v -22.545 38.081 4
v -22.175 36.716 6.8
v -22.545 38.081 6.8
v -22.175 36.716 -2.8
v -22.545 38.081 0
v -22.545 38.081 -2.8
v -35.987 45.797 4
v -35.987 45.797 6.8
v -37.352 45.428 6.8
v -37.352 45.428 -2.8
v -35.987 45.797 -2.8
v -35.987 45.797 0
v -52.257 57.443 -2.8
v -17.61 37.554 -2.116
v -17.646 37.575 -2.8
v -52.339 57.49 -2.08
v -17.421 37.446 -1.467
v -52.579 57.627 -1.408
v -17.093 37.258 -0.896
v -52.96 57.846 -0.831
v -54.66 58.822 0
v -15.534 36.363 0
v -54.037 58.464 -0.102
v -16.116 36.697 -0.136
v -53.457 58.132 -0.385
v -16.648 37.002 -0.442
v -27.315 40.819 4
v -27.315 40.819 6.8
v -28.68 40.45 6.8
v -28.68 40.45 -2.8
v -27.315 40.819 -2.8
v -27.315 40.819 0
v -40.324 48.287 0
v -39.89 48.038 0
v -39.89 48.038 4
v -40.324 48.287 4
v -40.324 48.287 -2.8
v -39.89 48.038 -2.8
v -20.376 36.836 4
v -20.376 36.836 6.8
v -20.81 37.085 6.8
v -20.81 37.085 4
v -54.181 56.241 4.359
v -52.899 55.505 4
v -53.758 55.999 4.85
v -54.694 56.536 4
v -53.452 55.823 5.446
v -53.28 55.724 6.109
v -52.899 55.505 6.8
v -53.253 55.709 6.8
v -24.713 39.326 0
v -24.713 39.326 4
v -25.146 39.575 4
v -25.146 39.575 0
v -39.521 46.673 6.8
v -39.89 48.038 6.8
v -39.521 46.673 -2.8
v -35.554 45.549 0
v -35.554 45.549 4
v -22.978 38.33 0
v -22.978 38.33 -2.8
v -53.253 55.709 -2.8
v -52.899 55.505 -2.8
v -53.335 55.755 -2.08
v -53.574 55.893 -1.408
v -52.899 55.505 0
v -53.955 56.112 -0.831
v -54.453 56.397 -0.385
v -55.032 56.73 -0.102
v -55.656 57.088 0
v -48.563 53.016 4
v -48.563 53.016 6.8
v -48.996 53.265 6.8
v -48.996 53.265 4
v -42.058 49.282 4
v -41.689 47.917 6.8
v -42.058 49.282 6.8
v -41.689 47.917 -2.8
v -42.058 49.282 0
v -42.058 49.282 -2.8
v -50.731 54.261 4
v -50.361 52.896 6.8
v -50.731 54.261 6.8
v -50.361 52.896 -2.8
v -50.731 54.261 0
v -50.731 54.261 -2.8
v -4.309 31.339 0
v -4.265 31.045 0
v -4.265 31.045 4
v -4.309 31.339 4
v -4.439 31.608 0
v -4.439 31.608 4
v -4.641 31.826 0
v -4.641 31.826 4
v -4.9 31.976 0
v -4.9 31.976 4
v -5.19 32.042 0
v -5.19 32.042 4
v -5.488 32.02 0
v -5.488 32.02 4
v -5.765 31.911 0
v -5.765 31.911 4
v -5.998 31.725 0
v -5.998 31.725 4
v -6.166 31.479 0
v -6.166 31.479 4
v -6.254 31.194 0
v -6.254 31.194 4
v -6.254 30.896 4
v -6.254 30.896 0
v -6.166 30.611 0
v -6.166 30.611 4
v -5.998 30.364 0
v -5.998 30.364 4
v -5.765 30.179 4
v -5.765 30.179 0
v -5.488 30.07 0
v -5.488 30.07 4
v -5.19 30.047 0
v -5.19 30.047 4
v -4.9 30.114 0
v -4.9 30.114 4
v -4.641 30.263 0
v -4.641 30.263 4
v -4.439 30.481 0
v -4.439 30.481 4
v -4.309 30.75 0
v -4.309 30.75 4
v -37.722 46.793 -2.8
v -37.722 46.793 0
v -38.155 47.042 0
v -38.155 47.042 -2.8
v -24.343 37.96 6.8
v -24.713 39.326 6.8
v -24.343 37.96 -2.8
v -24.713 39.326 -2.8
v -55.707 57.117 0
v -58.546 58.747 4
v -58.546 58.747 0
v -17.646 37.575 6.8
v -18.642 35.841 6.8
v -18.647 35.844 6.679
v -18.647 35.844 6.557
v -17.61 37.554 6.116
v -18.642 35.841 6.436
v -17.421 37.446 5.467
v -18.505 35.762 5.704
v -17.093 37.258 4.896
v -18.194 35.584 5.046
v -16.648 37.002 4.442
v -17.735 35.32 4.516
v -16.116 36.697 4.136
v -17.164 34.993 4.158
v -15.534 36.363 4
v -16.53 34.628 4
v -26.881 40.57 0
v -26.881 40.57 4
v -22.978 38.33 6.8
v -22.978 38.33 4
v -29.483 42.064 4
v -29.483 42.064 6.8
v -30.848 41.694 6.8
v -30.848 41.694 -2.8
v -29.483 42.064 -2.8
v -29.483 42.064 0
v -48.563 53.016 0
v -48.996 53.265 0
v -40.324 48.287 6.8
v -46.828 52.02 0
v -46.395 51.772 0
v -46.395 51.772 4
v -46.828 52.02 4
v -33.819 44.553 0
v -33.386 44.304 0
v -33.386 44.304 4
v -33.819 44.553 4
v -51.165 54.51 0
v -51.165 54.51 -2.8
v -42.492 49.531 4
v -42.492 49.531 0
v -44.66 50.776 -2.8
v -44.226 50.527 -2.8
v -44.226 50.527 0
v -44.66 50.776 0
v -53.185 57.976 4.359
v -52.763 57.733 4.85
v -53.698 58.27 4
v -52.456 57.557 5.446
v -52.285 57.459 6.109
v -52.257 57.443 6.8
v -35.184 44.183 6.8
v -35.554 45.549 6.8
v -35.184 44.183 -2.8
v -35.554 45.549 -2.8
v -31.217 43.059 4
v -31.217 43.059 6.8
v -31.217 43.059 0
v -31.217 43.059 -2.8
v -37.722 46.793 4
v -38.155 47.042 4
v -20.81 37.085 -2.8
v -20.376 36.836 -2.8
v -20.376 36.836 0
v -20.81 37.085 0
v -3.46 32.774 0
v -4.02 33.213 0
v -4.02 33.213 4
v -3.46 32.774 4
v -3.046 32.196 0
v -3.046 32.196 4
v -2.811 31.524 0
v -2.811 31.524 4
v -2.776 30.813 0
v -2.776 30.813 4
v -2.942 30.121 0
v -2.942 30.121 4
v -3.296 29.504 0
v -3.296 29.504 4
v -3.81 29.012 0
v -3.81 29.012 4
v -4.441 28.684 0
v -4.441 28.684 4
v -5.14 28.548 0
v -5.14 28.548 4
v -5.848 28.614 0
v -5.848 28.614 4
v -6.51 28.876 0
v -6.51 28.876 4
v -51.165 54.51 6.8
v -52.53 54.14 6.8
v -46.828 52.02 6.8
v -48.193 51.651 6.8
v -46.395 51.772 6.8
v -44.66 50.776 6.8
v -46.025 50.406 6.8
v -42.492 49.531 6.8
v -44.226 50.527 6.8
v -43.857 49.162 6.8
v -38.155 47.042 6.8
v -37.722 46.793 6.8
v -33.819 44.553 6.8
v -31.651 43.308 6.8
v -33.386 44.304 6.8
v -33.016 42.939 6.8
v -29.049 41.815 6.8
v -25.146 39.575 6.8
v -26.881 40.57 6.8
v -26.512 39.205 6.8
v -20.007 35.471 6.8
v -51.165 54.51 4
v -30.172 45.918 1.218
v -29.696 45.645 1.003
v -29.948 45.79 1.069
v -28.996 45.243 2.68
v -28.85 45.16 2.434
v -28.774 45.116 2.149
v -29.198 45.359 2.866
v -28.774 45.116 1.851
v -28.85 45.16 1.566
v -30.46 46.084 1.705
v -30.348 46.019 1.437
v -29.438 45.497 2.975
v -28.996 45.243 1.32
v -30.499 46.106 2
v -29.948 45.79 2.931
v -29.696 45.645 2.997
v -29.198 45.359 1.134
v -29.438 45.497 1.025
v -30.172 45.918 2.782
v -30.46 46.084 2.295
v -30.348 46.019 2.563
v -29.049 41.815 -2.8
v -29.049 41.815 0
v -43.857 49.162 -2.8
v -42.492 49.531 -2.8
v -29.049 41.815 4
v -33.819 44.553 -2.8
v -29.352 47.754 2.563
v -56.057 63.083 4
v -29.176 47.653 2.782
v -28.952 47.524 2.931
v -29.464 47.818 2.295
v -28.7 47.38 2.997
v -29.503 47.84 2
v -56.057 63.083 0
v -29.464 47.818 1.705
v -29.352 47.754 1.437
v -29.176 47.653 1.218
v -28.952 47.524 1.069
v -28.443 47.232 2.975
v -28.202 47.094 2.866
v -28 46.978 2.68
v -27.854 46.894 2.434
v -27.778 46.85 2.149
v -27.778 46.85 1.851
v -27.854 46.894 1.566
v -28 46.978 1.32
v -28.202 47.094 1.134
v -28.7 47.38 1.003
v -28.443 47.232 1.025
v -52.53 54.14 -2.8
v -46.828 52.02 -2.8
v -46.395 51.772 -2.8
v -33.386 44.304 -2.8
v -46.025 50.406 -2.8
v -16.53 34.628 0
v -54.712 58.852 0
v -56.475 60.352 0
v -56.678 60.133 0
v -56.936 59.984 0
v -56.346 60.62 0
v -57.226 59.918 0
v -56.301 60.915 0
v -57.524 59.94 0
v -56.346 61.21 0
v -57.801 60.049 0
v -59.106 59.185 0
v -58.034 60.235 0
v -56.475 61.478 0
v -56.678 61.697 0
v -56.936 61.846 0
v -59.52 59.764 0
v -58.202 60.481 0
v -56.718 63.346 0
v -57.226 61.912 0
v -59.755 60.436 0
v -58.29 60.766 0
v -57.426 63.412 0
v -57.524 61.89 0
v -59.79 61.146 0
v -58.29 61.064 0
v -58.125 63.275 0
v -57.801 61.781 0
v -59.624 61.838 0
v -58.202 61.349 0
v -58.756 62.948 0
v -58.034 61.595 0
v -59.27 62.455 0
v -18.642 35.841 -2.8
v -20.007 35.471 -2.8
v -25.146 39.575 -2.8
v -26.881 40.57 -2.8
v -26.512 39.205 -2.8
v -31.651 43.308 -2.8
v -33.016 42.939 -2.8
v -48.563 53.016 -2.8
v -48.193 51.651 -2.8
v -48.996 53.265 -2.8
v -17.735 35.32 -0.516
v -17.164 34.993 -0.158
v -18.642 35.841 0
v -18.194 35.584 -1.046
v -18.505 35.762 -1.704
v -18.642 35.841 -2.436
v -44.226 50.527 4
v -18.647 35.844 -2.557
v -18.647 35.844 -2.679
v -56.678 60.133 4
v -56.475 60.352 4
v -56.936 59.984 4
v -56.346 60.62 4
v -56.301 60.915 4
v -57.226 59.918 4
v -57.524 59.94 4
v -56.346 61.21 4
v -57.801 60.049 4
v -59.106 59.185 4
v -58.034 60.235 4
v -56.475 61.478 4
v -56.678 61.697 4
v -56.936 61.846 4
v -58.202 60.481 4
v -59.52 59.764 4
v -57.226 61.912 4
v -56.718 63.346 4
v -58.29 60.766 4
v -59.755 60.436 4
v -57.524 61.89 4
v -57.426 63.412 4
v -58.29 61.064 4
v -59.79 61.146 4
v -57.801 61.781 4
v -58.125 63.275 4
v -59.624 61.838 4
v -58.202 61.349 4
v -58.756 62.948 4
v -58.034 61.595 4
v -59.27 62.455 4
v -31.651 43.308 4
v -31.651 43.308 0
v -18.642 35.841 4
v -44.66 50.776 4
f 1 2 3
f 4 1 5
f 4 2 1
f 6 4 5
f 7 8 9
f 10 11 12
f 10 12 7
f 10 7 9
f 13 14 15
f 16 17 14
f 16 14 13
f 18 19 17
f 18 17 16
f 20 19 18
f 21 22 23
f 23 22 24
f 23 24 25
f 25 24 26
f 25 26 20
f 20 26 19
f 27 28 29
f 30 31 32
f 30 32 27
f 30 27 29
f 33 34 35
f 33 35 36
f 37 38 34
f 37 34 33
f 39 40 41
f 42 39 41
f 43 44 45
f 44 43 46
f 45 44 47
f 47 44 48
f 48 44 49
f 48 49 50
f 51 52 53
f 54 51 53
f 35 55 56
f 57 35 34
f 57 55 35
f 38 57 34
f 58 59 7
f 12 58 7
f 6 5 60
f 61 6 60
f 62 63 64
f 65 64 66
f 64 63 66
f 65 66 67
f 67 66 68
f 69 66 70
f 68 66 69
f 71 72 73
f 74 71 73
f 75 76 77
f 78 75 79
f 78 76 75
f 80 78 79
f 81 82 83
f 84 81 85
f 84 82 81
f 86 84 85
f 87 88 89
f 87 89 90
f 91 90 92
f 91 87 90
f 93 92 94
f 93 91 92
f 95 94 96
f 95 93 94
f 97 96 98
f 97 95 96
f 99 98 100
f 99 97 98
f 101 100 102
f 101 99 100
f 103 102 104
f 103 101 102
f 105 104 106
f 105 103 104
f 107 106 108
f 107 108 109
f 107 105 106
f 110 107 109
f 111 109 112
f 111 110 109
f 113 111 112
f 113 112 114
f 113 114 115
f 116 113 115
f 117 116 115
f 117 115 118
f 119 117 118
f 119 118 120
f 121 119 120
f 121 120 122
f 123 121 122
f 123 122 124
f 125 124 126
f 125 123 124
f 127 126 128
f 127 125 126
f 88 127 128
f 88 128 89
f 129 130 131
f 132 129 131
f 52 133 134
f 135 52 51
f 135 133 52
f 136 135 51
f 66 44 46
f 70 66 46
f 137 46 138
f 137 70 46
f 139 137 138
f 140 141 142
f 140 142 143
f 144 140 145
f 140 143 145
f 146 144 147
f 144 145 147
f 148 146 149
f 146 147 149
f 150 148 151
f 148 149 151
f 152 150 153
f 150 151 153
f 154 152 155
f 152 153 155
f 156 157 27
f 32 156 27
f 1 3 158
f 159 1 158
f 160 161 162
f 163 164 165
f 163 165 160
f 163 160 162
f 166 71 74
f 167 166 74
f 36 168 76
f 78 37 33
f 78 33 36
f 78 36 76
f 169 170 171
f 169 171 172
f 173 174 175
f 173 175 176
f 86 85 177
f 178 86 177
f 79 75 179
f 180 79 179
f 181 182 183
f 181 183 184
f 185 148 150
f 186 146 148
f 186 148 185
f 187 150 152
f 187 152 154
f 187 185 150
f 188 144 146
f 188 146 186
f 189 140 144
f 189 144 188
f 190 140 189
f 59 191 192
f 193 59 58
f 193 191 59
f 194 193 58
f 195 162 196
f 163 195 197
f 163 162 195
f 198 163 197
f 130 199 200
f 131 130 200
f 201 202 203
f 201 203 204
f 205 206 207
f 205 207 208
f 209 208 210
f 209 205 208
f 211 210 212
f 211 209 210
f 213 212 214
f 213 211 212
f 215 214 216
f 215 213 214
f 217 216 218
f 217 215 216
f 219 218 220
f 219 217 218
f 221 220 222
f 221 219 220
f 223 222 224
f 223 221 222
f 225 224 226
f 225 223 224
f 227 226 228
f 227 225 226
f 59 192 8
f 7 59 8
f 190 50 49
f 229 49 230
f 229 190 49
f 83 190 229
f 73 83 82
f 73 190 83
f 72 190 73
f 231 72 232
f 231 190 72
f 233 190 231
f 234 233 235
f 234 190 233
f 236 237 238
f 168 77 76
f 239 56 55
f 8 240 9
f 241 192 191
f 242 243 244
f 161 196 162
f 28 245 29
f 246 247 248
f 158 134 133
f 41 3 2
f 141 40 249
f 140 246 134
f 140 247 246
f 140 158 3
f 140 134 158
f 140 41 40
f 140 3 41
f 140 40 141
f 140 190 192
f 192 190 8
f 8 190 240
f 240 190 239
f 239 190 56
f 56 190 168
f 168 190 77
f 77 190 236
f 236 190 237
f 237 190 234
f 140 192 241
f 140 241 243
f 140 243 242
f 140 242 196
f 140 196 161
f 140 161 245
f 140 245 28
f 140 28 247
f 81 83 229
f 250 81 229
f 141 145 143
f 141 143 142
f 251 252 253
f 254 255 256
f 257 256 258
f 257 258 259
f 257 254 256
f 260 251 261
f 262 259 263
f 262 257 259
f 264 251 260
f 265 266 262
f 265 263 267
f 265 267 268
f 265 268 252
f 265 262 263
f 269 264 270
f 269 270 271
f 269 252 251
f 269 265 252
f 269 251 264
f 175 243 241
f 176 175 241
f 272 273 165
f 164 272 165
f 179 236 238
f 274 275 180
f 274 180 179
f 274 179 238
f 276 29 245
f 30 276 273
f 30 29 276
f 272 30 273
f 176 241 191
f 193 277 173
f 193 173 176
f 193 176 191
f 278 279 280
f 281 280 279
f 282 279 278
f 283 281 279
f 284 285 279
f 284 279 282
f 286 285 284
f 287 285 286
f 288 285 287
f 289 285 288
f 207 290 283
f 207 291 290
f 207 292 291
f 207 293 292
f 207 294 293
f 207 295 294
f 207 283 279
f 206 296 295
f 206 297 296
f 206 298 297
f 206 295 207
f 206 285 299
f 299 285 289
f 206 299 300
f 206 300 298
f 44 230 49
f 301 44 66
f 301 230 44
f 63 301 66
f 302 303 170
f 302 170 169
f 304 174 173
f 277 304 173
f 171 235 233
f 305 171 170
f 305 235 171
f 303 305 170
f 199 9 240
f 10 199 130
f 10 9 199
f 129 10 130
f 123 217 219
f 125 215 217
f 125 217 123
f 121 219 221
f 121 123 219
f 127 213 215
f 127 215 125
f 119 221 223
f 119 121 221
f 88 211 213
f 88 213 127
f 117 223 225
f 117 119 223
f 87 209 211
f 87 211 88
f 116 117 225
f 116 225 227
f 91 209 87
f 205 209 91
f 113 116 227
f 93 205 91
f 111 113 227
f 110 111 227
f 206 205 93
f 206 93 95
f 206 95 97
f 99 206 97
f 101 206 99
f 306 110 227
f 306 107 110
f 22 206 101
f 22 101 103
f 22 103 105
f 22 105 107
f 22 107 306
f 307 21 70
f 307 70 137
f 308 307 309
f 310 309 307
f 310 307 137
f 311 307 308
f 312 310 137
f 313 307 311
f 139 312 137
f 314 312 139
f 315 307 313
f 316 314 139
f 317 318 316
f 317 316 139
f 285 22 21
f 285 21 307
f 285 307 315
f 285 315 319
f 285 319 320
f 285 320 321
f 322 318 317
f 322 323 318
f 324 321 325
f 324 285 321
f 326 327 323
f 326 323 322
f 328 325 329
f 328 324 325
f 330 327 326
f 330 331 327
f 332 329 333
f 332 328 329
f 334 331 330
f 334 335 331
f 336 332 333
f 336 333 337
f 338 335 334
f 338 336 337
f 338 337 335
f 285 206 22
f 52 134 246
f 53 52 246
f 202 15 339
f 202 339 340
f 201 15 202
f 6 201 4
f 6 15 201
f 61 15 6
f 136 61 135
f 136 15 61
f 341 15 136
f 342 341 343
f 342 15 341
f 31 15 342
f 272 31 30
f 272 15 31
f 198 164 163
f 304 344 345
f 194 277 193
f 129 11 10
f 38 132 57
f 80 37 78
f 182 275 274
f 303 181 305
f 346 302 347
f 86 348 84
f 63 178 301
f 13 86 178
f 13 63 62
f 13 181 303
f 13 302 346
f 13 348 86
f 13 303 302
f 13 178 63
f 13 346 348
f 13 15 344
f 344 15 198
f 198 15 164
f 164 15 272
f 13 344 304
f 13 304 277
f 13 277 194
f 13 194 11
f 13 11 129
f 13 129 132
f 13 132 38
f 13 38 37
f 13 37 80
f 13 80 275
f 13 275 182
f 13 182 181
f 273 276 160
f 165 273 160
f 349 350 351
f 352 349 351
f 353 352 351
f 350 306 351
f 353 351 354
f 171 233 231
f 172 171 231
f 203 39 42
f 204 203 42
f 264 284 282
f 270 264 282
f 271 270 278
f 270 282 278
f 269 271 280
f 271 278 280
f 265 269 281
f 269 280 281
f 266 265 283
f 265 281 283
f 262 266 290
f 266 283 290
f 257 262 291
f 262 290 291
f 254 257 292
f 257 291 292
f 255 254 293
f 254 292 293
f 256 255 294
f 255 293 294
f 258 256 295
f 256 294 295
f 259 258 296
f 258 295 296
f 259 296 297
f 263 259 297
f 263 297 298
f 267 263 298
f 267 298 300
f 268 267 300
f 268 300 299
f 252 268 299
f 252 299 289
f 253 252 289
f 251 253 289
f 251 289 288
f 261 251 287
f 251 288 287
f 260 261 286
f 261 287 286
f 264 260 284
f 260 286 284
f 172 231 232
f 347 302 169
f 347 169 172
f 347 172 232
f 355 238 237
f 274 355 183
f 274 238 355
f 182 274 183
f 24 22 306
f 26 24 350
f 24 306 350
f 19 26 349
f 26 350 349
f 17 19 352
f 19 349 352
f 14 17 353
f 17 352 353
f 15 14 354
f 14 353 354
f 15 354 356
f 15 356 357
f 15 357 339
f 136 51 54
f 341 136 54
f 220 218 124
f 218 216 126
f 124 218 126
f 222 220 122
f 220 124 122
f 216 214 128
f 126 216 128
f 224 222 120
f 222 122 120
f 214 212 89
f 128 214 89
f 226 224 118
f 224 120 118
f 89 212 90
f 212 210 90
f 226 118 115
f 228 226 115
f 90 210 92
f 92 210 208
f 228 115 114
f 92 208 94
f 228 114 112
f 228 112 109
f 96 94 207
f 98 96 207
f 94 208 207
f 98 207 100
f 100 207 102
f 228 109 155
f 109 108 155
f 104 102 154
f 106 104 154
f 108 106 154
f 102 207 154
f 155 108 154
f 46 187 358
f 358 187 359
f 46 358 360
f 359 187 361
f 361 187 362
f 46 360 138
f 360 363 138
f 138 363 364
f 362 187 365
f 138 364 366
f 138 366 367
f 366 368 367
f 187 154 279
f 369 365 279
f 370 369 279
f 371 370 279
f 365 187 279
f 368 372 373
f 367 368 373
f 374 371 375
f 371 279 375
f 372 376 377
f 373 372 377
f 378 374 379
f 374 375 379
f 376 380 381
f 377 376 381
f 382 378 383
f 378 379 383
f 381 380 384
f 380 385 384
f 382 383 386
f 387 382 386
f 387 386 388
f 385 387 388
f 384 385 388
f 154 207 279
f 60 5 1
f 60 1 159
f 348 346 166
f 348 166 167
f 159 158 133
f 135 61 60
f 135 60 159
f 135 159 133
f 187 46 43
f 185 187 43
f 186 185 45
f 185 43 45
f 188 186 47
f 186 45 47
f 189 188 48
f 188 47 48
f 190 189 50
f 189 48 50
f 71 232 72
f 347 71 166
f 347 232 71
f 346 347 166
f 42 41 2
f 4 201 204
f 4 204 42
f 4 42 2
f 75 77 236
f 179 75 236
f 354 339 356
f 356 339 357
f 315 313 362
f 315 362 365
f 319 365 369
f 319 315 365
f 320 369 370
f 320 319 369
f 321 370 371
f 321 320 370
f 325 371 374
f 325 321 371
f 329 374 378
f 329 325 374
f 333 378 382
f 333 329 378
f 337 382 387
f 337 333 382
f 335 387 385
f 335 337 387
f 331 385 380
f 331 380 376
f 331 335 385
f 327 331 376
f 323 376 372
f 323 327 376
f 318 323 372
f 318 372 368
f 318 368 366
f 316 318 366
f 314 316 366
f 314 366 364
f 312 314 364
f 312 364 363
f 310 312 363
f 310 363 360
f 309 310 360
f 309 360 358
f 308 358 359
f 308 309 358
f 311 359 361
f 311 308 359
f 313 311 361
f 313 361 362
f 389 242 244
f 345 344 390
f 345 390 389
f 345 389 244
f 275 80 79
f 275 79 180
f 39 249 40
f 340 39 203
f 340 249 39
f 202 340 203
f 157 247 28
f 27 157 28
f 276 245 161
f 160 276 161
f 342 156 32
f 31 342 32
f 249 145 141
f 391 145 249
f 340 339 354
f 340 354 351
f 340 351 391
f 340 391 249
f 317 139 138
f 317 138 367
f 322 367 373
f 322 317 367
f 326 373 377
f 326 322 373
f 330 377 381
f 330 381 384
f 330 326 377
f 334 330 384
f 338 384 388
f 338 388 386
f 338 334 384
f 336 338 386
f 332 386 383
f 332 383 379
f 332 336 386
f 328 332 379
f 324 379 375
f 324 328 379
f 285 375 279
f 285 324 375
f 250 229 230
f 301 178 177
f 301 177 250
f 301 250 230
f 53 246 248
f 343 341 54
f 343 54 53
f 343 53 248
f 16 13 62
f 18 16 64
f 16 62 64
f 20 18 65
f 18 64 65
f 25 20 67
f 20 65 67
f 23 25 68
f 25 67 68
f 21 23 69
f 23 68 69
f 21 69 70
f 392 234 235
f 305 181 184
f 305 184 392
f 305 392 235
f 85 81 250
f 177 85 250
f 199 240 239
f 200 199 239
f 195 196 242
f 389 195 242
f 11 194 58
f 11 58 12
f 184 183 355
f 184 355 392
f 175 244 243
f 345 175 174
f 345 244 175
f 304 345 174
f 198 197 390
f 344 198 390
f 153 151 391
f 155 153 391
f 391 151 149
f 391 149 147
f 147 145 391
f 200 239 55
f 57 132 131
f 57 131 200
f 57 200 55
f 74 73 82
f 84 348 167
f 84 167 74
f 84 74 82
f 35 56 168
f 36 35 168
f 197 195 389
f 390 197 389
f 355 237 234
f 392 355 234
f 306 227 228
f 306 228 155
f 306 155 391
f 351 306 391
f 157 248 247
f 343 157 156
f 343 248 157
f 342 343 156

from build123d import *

# Parameters (mm, degrees)
SKETCH1_R           = 1
BOSS_EXTRUDE1_DEPTH = 4
SKETCH2_R           = 1
CUT_EXTRUDE1_DEPTH  = 2
BOSS_EXTRUDE2_DEPTH = 2
BOSS_EXTRUDE3_REACH = 89.691


with BuildPart() as part:
    # Sketch1 → Boss-Extrude1 (new body)
    with BuildSketch(Plane.XY):
        with BuildLine():
            Line((-56.056622595, 63.083032854), (-4.020390364, 33.212804613))
            ThreePointArc((-4.020390364, 33.212804613), (-3.096806864, 29.800035426), (-6.509576051, 28.876451927))
            Line((-6.509576051, 28.876451927), (-58.545808282, 58.746680168))
            ThreePointArc((-58.545808282, 58.746680168), (-59.469391781, 62.159449355), (-56.056622595, 63.083032854))
        make_face()
        with Locations((-57.301215438, 60.914856511)):
            Circle(SKETCH1_R, mode=Mode.SUBTRACT)
        with Locations((-5.264983207, 31.04462827)):
            Circle(SKETCH1_R, mode=Mode.SUBTRACT)
    extrude(amount=BOSS_EXTRUDE1_DEPTH)

    # Sketch2 → Cut-Extrude1 (cut)
    with BuildSketch(Plane(origin=(13.343522454, 23.245441166, 0), x_dir=(0.8672705371832455, -0.49783713735908147, 0), z_dir=(0.49783713735908147, 0.8672705371832455, 0))):
        with Locations(Location((-48.403705156, -2, 0), (0, 0, 180))):
            Circle(SKETCH2_R)
    extrude(amount=-CUT_EXTRUDE1_DEPTH, mode=Mode.SUBTRACT)

    # Sketch4 → Boss-Extrude2 (add)
    with BuildSketch(Plane(origin=(10.854336767, 18.90908848, 0), x_dir=(0.8672705371832455, -0.49783713735908136, 0), z_dir=(-0.49783713735908136, -0.8672705371832455, 0))):
        with BuildLine():
            Line((-73.918626185, 6.8), (-34.010435963, 6.8))
            ThreePointArc((-34.010435963, 6.8), (-33.372509372, 4.895560129), (-31.574784807, 4))
            Line((-31.574784807, 4), (-31.574784807, 0))
            ThreePointArc((-31.574784807, 0), (-33.372509372, -0.895560129), (-34.010435963, -2.8))
            Line((-34.010435963, -2.8), (-73.918626185, -2.8))
            ThreePointArc((-73.918626185, -2.8), (-74.749293349, -0.809525322), (-76.748459708, 0))
            Line((-76.748459708, 0), (-75.579913588, 4))
            ThreePointArc((-75.579913588, 4), (-74.306304145, 5.137180927), (-73.918626185, 6.8))
        make_face()
    extrude(amount=-BOSS_EXTRUDE2_DEPTH)

    # Boss-Extrude3: up to this face of the body (flat: up to its plane)
    boss_extrude3_end = Plane(part.part.faces().sort_by_distance((-35.449673949, 46.641906686, 6.8))[0])
    # Sketch5 → Boss-Extrude3 (add, up to the picked face)
    with BuildSketch(Plane(origin=(0, 0, -2.8), x_dir=(-1, 0, 0), z_dir=(0, 0, -1)), mode=Mode.PRIVATE) as boss_extrude3_sk1:
        Polygon((52.899098519, 55.505313486), (51.164557445, 54.509639211), (52.529665119, 54.140205811), align=None)
    boss_extrude3_tool1 = split(extrude(boss_extrude3_sk1.sketch, amount=-BOSS_EXTRUDE3_REACH, mode=Mode.PRIVATE), bisect_by=boss_extrude3_end, keep=Keep.BOTH, mode=Mode.PRIVATE)
    # Sketch5 → Boss-Extrude3 (add, up to the picked face)
    with BuildSketch(Plane(origin=(0, 0, -2.8), x_dir=(-1, 0, 0), z_dir=(0, 0, -1)), mode=Mode.PRIVATE) as boss_extrude3_sk2:
        Polygon((18.6419123, 35.84074656), (20.007019975, 35.47131316), (20.376453374, 36.836420835), align=None)
    boss_extrude3_tool2 = split(extrude(boss_extrude3_sk2.sketch, amount=-BOSS_EXTRUDE3_REACH, mode=Mode.PRIVATE), bisect_by=boss_extrude3_end, keep=Keep.BOTH, mode=Mode.PRIVATE)
    # Sketch5 → Boss-Extrude3 (add, up to the picked face)
    with BuildSketch(Plane(origin=(0, 0, -2.8), x_dir=(-1, 0, 0), z_dir=(0, 0, -1)), mode=Mode.PRIVATE) as boss_extrude3_sk3:
        Polygon((20.810088643, 37.085339404), (22.175196318, 36.715906004), (22.544629717, 38.081013678), align=None)
    boss_extrude3_tool3 = split(extrude(boss_extrude3_sk3.sketch, amount=-BOSS_EXTRUDE3_REACH, mode=Mode.PRIVATE), bisect_by=boss_extrude3_end, keep=Keep.BOTH, mode=Mode.PRIVATE)
    # Sketch5 → Boss-Extrude3 (add, up to the picked face)
    with BuildSketch(Plane(origin=(0, 0, -2.8), x_dir=(-1, 0, 0), z_dir=(0, 0, -1)), mode=Mode.PRIVATE) as boss_extrude3_sk4:
        Polygon((22.978264986, 38.329932247), (24.343372661, 37.960498847), (24.71280606, 39.325606522), align=None)
    boss_extrude3_tool4 = split(extrude(boss_extrude3_sk4.sketch, amount=-BOSS_EXTRUDE3_REACH, mode=Mode.PRIVATE), bisect_by=boss_extrude3_end, keep=Keep.BOTH, mode=Mode.PRIVATE)
    # Sketch5 → Boss-Extrude3 (add, up to the picked face)
    with BuildSketch(Plane(origin=(0, 0, -2.8), x_dir=(-1, 0, 0), z_dir=(0, 0, -1)), mode=Mode.PRIVATE) as boss_extrude3_sk5:
        Polygon((25.146441329, 39.57452509), (26.511549004, 39.205091691), (26.880982403, 40.570199365), align=None)
    boss_extrude3_tool5 = split(extrude(boss_extrude3_sk5.sketch, amount=-BOSS_EXTRUDE3_REACH, mode=Mode.PRIVATE), bisect_by=boss_extrude3_end, keep=Keep.BOTH, mode=Mode.PRIVATE)
    # Sketch5 → Boss-Extrude3 (add, up to the picked face)
    with BuildSketch(Plane(origin=(0, 0, -2.8), x_dir=(-1, 0, 0), z_dir=(0, 0, -1)), mode=Mode.PRIVATE) as boss_extrude3_sk6:
        Polygon((27.314617672, 40.819117934), (28.679725347, 40.449684534), (29.049158746, 41.814792208), align=None)
    boss_extrude3_tool6 = split(extrude(boss_extrude3_sk6.sketch, amount=-BOSS_EXTRUDE3_REACH, mode=Mode.PRIVATE), bisect_by=boss_extrude3_end, keep=Keep.BOTH, mode=Mode.PRIVATE)
    # Sketch5 → Boss-Extrude3 (add, up to the picked face)
    with BuildSketch(Plane(origin=(0, 0, -2.8), x_dir=(-1, 0, 0), z_dir=(0, 0, -1)), mode=Mode.PRIVATE) as boss_extrude3_sk7:
        Polygon((29.482794015, 42.063710777), (30.847901689, 41.694277377), (31.217335089, 43.059385052), align=None)
    boss_extrude3_tool7 = split(extrude(boss_extrude3_sk7.sketch, amount=-BOSS_EXTRUDE3_REACH, mode=Mode.PRIVATE), bisect_by=boss_extrude3_end, keep=Keep.BOTH, mode=Mode.PRIVATE)
    # Sketch5 → Boss-Extrude3 (add, up to the picked face)
    with BuildSketch(Plane(origin=(0, 0, -2.8), x_dir=(-1, 0, 0), z_dir=(0, 0, -1)), mode=Mode.PRIVATE) as boss_extrude3_sk8:
        Polygon((31.650970358, 43.308303621), (33.016078032, 42.938870221), (33.385511432, 44.303977895), align=None)
    boss_extrude3_tool8 = split(extrude(boss_extrude3_sk8.sketch, amount=-BOSS_EXTRUDE3_REACH, mode=Mode.PRIVATE), bisect_by=boss_extrude3_end, keep=Keep.BOTH, mode=Mode.PRIVATE)
    # Sketch5 → Boss-Extrude3 (add, up to the picked face)
    with BuildSketch(Plane(origin=(0, 0, -2.8), x_dir=(-1, 0, 0), z_dir=(0, 0, -1)), mode=Mode.PRIVATE) as boss_extrude3_sk9:
        Polygon((33.819146701, 44.552896464), (35.184254375, 44.183463064), (35.553687775, 45.548570739), align=None)
    boss_extrude3_tool9 = split(extrude(boss_extrude3_sk9.sketch, amount=-BOSS_EXTRUDE3_REACH, mode=Mode.PRIVATE), bisect_by=boss_extrude3_end, keep=Keep.BOTH, mode=Mode.PRIVATE)
    # Sketch5 → Boss-Extrude3 (add, up to the picked face)
    with BuildSketch(Plane(origin=(0, 0, -2.8), x_dir=(-1, 0, 0), z_dir=(0, 0, -1)), mode=Mode.PRIVATE) as boss_extrude3_sk10:
        Polygon((35.987323044, 45.797489307), (37.352430718, 45.428055908), (37.721864118, 46.793163582), align=None)
    boss_extrude3_tool10 = split(extrude(boss_extrude3_sk10.sketch, amount=-BOSS_EXTRUDE3_REACH, mode=Mode.PRIVATE), bisect_by=boss_extrude3_end, keep=Keep.BOTH, mode=Mode.PRIVATE)
    # Sketch5 → Boss-Extrude3 (add, up to the picked face)
    with BuildSketch(Plane(origin=(0, 0, -2.8), x_dir=(-1, 0, 0), z_dir=(0, 0, -1)), mode=Mode.PRIVATE) as boss_extrude3_sk11:
        Polygon((38.155499387, 47.042082151), (39.520607061, 46.672648751), (39.890040461, 48.037756425), align=None)
    boss_extrude3_tool11 = split(extrude(boss_extrude3_sk11.sketch, amount=-BOSS_EXTRUDE3_REACH, mode=Mode.PRIVATE), bisect_by=boss_extrude3_end, keep=Keep.BOTH, mode=Mode.PRIVATE)
    # Sketch5 → Boss-Extrude3 (add, up to the picked face)
    with BuildSketch(Plane(origin=(0, 0, -2.8), x_dir=(-1, 0, 0), z_dir=(0, 0, -1)), mode=Mode.PRIVATE) as boss_extrude3_sk12:
        Polygon((40.32367573, 48.286674994), (41.688783404, 47.917241594), (42.058216804, 49.282349269), align=None)
    boss_extrude3_tool12 = split(extrude(boss_extrude3_sk12.sketch, amount=-BOSS_EXTRUDE3_REACH, mode=Mode.PRIVATE), bisect_by=boss_extrude3_end, keep=Keep.BOTH, mode=Mode.PRIVATE)
    # Sketch5 → Boss-Extrude3 (add, up to the picked face)
    with BuildSketch(Plane(origin=(0, 0, -2.8), x_dir=(-1, 0, 0), z_dir=(0, 0, -1)), mode=Mode.PRIVATE) as boss_extrude3_sk13:
        Polygon((42.491852073, 49.531267838), (43.856959747, 49.161834438), (44.226393147, 50.526942112), align=None)
    boss_extrude3_tool13 = split(extrude(boss_extrude3_sk13.sketch, amount=-BOSS_EXTRUDE3_REACH, mode=Mode.PRIVATE), bisect_by=boss_extrude3_end, keep=Keep.BOTH, mode=Mode.PRIVATE)
    # Sketch5 → Boss-Extrude3 (add, up to the picked face)
    with BuildSketch(Plane(origin=(0, 0, -2.8), x_dir=(-1, 0, 0), z_dir=(0, 0, -1)), mode=Mode.PRIVATE) as boss_extrude3_sk14:
        Polygon((44.660028416, 50.775860681), (46.02513609, 50.406427281), (46.39456949, 51.771534956), align=None)
    boss_extrude3_tool14 = split(extrude(boss_extrude3_sk14.sketch, amount=-BOSS_EXTRUDE3_REACH, mode=Mode.PRIVATE), bisect_by=boss_extrude3_end, keep=Keep.BOTH, mode=Mode.PRIVATE)
    # Sketch5 → Boss-Extrude3 (add, up to the picked face)
    with BuildSketch(Plane(origin=(0, 0, -2.8), x_dir=(-1, 0, 0), z_dir=(0, 0, -1)), mode=Mode.PRIVATE) as boss_extrude3_sk15:
        Polygon((46.828204759, 52.020453524), (48.193312433, 51.651020125), (48.562745833, 53.016127799), align=None)
    boss_extrude3_tool15 = split(extrude(boss_extrude3_sk15.sketch, amount=-BOSS_EXTRUDE3_REACH, mode=Mode.PRIVATE), bisect_by=boss_extrude3_end, keep=Keep.BOTH, mode=Mode.PRIVATE)
    # Sketch5 → Boss-Extrude3 (add, up to the picked face)
    with BuildSketch(Plane(origin=(0, 0, -2.8), x_dir=(-1, 0, 0), z_dir=(0, 0, -1)), mode=Mode.PRIVATE) as boss_extrude3_sk16:
        Polygon((48.996381102, 53.265046368), (50.361488776, 52.895612968), (50.730922176, 54.260720642), align=None)
    boss_extrude3_tool16 = split(extrude(boss_extrude3_sk16.sketch, amount=-BOSS_EXTRUDE3_REACH, mode=Mode.PRIVATE), bisect_by=boss_extrude3_end, keep=Keep.BOTH, mode=Mode.PRIVATE)
    add(boss_extrude3_tool1.solids().sort_by(Axis((-52.197774, 54.718386, -2.8), (0, 0, 1)))[0])
    add(boss_extrude3_tool2.solids().sort_by(Axis((-19.675129, 36.049494, -2.8), (0, 0, 1)))[0])
    add(boss_extrude3_tool3.solids().sort_by(Axis((-21.843305, 37.294086, -2.8), (0, 0, 1)))[0])
    add(boss_extrude3_tool4.solids().sort_by(Axis((-24.011481, 38.538679, -2.8), (0, 0, 1)))[0])
    add(boss_extrude3_tool5.solids().sort_by(Axis((-26.179658, 39.783272, -2.8), (0, 0, 1)))[0])
    add(boss_extrude3_tool6.solids().sort_by(Axis((-28.347834, 41.027865, -2.8), (0, 0, 1)))[0])
    add(boss_extrude3_tool7.solids().sort_by(Axis((-30.51601, 42.272458, -2.8), (0, 0, 1)))[0])
    add(boss_extrude3_tool8.solids().sort_by(Axis((-32.684187, 43.517051, -2.8), (0, 0, 1)))[0])
    add(boss_extrude3_tool9.solids().sort_by(Axis((-34.852363, 44.761643, -2.8), (0, 0, 1)))[0])
    add(boss_extrude3_tool10.solids().sort_by(Axis((-37.020539, 46.006236, -2.8), (0, 0, 1)))[0])
    add(boss_extrude3_tool11.solids().sort_by(Axis((-39.188716, 47.250829, -2.8), (0, 0, 1)))[0])
    add(boss_extrude3_tool12.solids().sort_by(Axis((-41.356892, 48.495422, -2.8), (0, 0, 1)))[0])
    add(boss_extrude3_tool13.solids().sort_by(Axis((-43.525068, 49.740015, -2.8), (0, 0, 1)))[0])
    add(boss_extrude3_tool14.solids().sort_by(Axis((-45.693245, 50.984608, -2.8), (0, 0, 1)))[0])
    add(boss_extrude3_tool15.solids().sort_by(Axis((-47.861421, 52.2292, -2.8), (0, 0, 1)))[0])
    add(boss_extrude3_tool16.solids().sort_by(Axis((-50.029597, 53.473793, -2.8), (0, 0, 1)))[0])


solid = part.part
